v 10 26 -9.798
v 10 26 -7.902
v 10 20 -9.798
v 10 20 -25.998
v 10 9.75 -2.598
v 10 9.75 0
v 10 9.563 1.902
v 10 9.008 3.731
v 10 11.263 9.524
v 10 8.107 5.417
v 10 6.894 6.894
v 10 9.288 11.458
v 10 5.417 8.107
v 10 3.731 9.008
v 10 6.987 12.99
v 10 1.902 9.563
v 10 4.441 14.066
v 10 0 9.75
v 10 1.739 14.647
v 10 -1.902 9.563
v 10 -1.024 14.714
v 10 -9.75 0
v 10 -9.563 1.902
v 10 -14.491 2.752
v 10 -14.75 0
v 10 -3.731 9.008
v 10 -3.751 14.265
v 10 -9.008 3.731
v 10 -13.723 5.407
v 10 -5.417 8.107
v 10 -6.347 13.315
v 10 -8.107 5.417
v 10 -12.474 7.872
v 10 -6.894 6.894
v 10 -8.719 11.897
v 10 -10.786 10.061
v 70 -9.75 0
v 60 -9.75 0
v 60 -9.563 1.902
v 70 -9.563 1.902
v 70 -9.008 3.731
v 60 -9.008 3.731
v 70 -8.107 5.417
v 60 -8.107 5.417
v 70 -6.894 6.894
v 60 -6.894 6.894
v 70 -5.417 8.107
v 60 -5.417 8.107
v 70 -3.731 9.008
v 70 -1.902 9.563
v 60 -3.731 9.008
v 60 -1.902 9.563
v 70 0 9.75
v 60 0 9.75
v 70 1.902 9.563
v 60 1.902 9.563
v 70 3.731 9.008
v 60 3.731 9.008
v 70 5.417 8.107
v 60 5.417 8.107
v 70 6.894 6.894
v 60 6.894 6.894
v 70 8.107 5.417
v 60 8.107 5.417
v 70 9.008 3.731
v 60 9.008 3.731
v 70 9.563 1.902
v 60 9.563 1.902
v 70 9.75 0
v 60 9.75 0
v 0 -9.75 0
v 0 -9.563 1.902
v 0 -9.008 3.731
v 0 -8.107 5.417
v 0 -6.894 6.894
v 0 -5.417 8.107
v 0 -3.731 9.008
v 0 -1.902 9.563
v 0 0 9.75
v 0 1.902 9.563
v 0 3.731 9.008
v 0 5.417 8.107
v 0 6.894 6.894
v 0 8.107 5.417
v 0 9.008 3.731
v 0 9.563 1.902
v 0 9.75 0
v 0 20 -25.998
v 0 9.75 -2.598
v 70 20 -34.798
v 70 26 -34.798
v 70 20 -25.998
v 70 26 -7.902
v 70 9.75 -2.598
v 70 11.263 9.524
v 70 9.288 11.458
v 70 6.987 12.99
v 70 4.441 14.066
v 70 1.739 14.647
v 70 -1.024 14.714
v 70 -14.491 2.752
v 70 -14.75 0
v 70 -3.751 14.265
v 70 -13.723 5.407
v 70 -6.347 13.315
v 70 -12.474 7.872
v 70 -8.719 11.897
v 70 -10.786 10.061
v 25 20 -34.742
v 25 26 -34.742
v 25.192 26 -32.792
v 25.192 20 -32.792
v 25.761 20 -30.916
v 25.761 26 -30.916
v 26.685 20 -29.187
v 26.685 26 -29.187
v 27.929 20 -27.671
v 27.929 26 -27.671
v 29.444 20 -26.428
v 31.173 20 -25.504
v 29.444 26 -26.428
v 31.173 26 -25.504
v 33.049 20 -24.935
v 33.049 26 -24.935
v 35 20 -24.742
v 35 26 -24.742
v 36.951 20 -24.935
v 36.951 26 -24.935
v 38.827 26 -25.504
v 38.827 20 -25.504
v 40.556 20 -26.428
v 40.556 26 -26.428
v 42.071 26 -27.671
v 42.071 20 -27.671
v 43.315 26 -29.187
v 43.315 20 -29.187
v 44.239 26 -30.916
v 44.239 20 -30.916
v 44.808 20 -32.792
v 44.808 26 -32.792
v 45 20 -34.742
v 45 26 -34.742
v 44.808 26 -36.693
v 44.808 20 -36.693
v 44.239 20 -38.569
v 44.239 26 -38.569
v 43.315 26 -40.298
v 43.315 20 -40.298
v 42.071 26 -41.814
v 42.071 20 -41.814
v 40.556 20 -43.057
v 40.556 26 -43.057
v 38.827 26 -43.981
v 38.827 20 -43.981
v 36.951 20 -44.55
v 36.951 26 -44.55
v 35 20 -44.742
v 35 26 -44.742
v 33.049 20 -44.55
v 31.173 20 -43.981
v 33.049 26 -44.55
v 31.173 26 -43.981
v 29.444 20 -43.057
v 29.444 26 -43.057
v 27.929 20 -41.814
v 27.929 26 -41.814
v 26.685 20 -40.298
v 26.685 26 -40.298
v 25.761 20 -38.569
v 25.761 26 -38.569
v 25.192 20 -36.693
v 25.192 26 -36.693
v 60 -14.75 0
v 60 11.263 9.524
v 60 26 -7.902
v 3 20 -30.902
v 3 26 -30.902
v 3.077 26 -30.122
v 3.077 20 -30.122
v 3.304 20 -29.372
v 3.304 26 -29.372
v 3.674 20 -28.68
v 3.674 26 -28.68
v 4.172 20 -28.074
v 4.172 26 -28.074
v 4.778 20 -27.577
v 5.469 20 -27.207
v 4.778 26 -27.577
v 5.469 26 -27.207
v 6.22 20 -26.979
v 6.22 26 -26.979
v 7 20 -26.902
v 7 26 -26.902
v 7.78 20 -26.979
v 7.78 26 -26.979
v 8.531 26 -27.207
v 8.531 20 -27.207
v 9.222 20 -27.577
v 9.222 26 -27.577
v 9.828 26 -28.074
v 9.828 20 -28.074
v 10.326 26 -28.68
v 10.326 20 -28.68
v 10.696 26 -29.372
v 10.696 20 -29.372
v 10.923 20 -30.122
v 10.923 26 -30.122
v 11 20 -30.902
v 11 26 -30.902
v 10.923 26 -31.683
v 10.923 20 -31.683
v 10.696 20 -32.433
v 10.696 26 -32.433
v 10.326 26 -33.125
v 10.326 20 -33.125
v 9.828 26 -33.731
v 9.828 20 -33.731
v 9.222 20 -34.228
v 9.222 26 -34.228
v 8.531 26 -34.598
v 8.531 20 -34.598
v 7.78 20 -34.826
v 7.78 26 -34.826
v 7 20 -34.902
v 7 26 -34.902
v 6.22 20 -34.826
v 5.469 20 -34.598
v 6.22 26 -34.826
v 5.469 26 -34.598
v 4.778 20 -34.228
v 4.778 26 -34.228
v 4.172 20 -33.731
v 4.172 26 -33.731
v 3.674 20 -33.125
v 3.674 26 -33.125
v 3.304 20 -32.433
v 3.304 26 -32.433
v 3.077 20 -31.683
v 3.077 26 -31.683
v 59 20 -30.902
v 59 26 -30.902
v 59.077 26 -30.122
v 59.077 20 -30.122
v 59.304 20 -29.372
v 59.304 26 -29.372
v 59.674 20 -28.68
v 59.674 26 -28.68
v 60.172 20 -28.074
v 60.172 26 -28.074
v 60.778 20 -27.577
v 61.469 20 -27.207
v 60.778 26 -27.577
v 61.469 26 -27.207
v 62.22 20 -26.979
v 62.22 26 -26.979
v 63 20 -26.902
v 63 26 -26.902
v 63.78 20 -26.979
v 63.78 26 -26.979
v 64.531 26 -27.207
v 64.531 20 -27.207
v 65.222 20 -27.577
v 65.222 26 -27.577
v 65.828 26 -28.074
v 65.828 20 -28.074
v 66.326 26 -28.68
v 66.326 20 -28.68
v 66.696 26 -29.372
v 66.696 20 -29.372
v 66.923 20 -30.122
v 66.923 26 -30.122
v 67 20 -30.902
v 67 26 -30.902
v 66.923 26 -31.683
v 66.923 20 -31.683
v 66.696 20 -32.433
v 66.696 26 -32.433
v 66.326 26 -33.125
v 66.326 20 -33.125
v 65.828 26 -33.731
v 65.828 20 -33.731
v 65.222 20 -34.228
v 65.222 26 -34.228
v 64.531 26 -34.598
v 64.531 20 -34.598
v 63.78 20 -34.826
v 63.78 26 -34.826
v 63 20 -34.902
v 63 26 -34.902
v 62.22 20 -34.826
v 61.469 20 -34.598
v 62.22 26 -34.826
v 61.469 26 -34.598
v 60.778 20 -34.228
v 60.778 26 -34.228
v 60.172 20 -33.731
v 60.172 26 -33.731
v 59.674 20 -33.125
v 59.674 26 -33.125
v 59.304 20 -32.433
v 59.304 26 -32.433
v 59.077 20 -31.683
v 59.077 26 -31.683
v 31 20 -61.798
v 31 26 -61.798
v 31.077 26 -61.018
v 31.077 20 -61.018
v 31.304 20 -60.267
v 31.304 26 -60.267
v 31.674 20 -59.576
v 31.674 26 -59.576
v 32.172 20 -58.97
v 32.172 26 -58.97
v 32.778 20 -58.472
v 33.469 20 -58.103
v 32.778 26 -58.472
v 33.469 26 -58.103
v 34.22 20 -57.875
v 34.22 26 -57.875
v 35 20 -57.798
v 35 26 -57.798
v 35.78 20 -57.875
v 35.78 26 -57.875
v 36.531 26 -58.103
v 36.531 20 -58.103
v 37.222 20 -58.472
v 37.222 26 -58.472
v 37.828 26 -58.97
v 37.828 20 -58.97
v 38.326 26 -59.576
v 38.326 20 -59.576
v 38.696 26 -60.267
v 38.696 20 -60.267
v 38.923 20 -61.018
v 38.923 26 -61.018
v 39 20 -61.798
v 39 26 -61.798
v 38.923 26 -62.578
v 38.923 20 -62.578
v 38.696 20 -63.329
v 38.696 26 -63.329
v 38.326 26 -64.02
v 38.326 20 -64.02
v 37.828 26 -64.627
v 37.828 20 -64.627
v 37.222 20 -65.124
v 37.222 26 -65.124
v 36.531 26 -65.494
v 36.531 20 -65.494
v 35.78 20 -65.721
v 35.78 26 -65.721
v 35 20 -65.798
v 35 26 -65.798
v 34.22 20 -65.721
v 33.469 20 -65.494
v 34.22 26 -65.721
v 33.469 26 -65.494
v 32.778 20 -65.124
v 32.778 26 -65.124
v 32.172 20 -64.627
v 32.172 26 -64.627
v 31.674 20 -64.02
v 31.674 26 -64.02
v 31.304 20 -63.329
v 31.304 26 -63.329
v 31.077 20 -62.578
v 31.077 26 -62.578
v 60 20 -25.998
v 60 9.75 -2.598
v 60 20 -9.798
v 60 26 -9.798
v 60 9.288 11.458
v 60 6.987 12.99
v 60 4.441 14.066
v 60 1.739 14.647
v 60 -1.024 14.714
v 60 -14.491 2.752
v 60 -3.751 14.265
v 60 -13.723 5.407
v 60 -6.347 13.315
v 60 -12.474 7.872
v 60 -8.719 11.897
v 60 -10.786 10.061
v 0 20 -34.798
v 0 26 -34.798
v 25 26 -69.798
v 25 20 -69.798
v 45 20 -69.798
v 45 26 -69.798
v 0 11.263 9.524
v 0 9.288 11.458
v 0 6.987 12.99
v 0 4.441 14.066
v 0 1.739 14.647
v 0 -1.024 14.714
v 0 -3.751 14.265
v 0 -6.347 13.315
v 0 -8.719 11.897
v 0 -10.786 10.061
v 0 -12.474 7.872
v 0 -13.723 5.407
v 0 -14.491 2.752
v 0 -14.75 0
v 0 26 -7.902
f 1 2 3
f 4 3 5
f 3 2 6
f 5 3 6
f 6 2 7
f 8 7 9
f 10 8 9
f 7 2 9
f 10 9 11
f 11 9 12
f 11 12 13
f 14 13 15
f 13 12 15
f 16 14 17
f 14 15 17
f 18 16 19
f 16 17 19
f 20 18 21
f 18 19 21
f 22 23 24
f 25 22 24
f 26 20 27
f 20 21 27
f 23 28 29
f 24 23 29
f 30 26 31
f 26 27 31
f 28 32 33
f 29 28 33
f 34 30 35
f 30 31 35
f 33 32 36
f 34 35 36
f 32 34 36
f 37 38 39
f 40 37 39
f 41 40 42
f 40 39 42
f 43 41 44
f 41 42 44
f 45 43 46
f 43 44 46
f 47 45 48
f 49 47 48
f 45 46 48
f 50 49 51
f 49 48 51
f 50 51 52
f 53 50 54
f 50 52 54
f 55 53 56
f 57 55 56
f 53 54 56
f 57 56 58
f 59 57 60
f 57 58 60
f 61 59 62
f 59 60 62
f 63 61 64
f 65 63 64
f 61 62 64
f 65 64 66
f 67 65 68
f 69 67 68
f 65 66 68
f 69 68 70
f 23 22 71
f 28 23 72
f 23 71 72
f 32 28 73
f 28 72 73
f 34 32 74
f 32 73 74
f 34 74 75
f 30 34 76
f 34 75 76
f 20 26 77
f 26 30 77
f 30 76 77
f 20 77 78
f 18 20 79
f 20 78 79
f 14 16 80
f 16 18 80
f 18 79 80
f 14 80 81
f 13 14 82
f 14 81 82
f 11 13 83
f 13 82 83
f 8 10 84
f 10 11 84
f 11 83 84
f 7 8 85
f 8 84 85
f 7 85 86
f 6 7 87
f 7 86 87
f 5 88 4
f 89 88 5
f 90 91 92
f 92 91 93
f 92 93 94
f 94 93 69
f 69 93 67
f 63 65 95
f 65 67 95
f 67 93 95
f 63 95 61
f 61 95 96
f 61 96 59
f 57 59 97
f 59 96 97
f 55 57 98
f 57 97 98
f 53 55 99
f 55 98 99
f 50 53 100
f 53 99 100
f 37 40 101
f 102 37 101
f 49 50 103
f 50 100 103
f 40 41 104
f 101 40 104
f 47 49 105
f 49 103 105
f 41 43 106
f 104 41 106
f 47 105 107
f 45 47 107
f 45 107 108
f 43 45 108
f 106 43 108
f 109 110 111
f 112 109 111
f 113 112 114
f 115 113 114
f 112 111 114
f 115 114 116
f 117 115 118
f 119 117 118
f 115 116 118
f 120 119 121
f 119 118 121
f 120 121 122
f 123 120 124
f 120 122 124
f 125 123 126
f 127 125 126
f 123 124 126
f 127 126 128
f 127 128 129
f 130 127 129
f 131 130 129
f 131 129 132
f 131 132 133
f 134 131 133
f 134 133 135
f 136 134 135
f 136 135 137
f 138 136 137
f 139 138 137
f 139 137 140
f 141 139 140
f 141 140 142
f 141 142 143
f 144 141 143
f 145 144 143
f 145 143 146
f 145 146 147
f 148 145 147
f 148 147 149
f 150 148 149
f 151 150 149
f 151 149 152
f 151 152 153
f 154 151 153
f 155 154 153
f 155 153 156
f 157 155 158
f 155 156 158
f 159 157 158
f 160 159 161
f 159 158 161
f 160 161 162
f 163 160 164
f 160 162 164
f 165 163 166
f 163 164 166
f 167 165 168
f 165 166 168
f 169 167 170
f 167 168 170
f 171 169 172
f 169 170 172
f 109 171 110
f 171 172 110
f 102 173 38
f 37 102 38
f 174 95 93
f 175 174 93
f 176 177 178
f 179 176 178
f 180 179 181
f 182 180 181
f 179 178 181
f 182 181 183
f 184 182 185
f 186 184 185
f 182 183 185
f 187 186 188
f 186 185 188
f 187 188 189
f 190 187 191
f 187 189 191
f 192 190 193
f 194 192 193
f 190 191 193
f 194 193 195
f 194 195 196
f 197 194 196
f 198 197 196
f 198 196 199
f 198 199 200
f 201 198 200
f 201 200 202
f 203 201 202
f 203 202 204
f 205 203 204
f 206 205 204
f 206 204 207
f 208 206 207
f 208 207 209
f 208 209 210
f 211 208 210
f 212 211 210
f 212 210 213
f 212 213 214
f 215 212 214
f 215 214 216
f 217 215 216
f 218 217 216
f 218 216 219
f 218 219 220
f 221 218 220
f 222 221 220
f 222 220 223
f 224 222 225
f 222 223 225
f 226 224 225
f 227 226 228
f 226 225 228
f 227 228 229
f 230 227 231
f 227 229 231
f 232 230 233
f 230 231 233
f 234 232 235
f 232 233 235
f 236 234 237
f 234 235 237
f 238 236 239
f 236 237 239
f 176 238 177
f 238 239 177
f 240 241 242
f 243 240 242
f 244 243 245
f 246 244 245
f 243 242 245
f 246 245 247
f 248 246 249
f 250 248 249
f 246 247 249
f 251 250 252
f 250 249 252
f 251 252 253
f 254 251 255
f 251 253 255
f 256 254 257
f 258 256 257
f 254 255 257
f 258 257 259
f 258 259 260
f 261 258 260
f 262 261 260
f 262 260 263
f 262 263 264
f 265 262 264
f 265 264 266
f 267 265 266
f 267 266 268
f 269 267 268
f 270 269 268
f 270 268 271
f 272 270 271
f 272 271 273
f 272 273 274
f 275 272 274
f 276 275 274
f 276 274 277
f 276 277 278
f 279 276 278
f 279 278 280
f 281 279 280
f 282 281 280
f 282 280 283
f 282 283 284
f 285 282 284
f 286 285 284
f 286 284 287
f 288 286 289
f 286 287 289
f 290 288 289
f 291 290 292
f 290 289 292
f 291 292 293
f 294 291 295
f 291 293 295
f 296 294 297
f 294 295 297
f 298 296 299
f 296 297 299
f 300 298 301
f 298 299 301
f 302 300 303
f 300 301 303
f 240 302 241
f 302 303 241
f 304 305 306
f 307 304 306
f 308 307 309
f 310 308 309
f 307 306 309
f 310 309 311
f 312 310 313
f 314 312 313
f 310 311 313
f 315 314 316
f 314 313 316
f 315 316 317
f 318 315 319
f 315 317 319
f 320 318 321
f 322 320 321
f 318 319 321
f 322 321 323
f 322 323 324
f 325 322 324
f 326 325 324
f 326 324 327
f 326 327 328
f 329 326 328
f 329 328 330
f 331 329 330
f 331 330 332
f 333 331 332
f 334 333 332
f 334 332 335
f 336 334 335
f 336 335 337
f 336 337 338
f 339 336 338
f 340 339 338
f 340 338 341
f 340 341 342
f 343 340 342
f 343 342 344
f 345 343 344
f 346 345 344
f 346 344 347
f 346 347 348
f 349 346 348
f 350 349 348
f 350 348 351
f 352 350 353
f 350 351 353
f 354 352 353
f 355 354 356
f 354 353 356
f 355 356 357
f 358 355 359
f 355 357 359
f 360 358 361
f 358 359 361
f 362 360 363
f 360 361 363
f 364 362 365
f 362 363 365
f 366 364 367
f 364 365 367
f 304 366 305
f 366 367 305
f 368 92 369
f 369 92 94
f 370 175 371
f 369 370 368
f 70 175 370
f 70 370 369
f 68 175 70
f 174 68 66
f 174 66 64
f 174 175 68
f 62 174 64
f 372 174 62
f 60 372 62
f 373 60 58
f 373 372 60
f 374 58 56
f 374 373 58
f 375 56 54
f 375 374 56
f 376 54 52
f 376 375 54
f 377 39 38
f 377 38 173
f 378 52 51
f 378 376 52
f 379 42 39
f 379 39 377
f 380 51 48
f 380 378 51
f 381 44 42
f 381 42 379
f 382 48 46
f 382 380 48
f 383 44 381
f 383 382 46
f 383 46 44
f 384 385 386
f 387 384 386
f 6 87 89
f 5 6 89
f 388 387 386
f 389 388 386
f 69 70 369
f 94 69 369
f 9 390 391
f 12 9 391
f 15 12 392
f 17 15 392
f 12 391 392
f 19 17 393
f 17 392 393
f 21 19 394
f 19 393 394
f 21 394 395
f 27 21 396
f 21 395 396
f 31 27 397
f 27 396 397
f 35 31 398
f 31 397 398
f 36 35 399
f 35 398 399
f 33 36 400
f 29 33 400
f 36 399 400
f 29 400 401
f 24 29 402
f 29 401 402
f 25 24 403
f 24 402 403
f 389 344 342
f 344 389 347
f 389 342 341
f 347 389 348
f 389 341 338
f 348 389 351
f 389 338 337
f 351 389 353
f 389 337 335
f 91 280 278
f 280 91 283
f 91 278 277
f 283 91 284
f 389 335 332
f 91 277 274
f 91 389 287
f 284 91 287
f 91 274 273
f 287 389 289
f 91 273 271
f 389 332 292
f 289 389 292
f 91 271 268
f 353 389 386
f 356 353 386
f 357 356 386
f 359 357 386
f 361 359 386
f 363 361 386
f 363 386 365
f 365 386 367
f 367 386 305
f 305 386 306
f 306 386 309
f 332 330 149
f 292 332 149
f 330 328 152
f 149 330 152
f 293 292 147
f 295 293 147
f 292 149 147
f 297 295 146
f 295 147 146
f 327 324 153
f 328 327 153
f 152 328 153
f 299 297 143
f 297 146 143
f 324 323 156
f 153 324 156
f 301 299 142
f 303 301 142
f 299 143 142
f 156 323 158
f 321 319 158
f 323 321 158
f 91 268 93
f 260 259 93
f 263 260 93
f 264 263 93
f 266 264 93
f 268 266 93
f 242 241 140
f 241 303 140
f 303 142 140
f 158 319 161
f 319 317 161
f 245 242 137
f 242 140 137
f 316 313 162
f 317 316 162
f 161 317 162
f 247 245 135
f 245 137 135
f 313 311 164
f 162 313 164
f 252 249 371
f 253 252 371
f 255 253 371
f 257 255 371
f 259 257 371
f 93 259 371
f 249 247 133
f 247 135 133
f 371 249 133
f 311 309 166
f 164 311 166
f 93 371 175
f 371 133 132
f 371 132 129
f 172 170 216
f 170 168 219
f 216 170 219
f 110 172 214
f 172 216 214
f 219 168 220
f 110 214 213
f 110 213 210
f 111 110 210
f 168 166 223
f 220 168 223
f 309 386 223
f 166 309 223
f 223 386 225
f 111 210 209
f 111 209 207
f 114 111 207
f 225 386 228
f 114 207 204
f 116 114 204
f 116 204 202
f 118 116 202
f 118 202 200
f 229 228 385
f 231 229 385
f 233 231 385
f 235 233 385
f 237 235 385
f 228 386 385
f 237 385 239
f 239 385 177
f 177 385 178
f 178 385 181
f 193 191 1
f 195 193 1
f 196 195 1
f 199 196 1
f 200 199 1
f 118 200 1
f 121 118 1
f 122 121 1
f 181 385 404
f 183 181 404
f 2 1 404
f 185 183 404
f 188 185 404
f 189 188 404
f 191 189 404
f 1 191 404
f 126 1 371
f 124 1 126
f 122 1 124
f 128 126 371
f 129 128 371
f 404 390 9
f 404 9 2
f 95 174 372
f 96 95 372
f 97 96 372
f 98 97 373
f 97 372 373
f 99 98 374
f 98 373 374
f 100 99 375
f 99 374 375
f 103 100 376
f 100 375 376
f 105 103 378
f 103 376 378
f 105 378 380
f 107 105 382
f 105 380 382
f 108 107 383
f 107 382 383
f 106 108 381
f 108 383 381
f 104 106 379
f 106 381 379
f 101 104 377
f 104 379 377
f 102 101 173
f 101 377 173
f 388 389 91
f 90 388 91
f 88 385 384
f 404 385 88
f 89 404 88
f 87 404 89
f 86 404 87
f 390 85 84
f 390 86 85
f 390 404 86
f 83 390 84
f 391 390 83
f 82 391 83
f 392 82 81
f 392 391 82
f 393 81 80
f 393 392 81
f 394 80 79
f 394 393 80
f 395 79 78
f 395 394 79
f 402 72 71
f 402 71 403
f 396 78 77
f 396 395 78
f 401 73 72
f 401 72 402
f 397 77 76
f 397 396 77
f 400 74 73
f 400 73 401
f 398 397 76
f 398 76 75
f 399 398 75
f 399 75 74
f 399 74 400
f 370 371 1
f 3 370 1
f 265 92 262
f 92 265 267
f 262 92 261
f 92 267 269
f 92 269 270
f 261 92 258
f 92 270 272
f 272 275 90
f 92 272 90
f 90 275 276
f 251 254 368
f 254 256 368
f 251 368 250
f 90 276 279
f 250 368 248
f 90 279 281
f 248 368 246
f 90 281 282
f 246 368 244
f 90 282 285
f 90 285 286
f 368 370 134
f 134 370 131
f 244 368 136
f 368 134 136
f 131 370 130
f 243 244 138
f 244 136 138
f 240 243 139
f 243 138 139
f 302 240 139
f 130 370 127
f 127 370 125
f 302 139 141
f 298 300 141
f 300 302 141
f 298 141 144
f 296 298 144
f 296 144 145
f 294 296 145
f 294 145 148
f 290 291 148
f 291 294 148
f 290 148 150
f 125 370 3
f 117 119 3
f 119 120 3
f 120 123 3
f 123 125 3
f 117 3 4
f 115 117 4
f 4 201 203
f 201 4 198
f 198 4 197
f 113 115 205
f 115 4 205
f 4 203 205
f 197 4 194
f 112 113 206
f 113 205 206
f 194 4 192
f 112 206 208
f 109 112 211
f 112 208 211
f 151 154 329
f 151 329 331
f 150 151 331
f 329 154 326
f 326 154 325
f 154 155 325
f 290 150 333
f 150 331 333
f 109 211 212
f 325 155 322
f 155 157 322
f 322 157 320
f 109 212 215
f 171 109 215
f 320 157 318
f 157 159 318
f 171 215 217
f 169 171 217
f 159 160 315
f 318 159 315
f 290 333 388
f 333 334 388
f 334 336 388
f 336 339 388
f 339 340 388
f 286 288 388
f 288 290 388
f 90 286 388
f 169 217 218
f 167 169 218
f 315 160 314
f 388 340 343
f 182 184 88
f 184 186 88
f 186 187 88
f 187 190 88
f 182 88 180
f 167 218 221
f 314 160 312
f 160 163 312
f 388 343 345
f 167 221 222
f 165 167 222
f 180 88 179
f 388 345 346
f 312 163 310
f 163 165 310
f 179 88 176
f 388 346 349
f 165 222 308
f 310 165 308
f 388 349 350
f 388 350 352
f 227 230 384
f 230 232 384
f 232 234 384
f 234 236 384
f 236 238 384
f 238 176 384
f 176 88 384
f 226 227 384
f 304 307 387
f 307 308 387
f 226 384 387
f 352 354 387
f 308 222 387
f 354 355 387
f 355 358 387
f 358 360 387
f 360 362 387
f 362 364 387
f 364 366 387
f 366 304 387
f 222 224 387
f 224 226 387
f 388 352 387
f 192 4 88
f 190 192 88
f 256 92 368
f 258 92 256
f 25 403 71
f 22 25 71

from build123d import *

# Parameters (mm, degrees)
F1_DEPTH  = 70
F4_W      = 50
F4_H      = 24.5480843189
F5_DEPTH  = 25
F7_DEPTH  = 40.7510000745
F8_R      = 10
F9_DEPTH  = 40.7510000745
F10_R     = 6.38
F11_DEPTH = 40.7510000745
F6_R      = 4
F12_DEPTH = 40.7510000745
F15_DEPTH = 10
F16_R     = 4
F17_DEPTH = 40.7510000745
F19_DEPTH = 10


# Not quite as in the source:
# - a pattern or mirror of a feature is missing from the dataset's text; its kind, count and spacing are read off the source's solid


with BuildPart() as f1:
    # F0 (on Right) → F1 (new body)
    with BuildSketch(Plane.YZ):
        with BuildLine():
            ThreePointArc((-9.75, 0), (0, 9.75), (9.75, 0))
            Line((9.75, 0), (9.75, -2.5980842444))
            Line((9.75, -2.5980842444), (20, -9.7980842444))
            Line((20, -9.7980842444), (20, -69.7980842444))
            Line((20, -69.7980842444), (26, -69.7980842444))
            Line((26, -69.7980842444), (26, -7.9024389721))
            Line((26, -7.9024389721), (14.7500000745, 0))
            ThreePointArc((14.7500000745, 0), (0, 14.7500000745), (-14.7500000745, 0))
            Line((-14.7500000745, 0), (-9.75, 0))
        make_face()
    extrude(amount=F1_DEPTH)

    # F4 (on face) → F5 (cut)
    with BuildSketch(Plane(origin=(0, 26, 0), x_dir=(-1, 0, 0), z_dir=(0, 1, 0))):
        Polygon((-45, -69.7980842444), (-70, -34.7980842444), (-90, -34.7980842444), (-90, -94.7980842444), (20, -94.7980842444), (20, -34.7980842444), (0, -34.7980842444), (-25, -69.7980842444), align=None)
        with Locations((-35, 2.475957915)):
            Rectangle(F4_W, F4_H)
    extrude(amount=-F5_DEPTH, mode=Mode.SUBTRACT)

    # F4 (on face) → F7 (cut, through all)
    with BuildSketch(Plane(origin=(0, 26, 0), x_dir=(-1, 0, 0), z_dir=(0, 1, 0))):
        Polygon((-45, -69.7980842444), (-70, -34.7980842444), (-90, -34.7980842444), (-90, -94.7980842444), (20, -94.7980842444), (20, -34.7980842444), (0, -34.7980842444), (-25, -69.7980842444), align=None)
        with Locations((-35, 2.475957915)):
            Rectangle(F4_W, F4_H)
    extrude(amount=-F7_DEPTH, mode=Mode.SUBTRACT)

    # F8 (on face) → F9 (cut, through all)
    with BuildSketch(Plane(origin=(0, 26, 0), x_dir=(-1, 0, 0), z_dir=(0, 1, 0))):
        with Locations((-35, -34.7424389721)):
            Circle(F8_R)
    extrude(amount=-F9_DEPTH, mode=Mode.SUBTRACT)

    # F10 (on face) → F11 (cut, through all)
    with BuildSketch(Plane(origin=(0, 26, 0), x_dir=(-1, 0, 0), z_dir=(0, 1, 0))):
        with Locations((-35, -34.7424389721)):
            Circle(F10_R)
    extrude(amount=-F11_DEPTH, mode=Mode.SUBTRACT)

    # F6 (on face) → F12 (cut, through all)
    with BuildSketch(Plane(origin=(0, 26, 0), x_dir=(-1, 0, 0), z_dir=(0, 1, 0))):
        with Locations((-63, -30.9024389721)):
            Circle(F6_R)
        with Locations((-7, -30.9024389721)):
            Circle(F6_R)
    extrude(amount=-F12_DEPTH, mode=Mode.SUBTRACT)

    # F14 (on face) → F15 (join)
    with BuildSketch(Plane(origin=(0, 0, 0), x_dir=(0, -1, 0), z_dir=(-1, 0, 0))):
        Polygon((-20, -9.7980842444), (-20, -25.9981378913), (-9.75, -2.5980842444), align=None)
    f15 = extrude(amount=-F15_DEPTH)

    # F15_copies: F15 across plane
    add(f15.mirror(Plane(origin=(35, 0, 0), x_dir=(0, 0, 1), z_dir=(1, 0, 0))))

    # F16 (on face) → F17 (cut, through all)
    with BuildSketch(Plane(origin=(0, 26, 0), x_dir=(-1, 0, 0), z_dir=(0, 1, 0))):
        with Locations((-35, -61.7980842444)):
            Circle(F16_R)
    extrude(amount=-F17_DEPTH, mode=Mode.SUBTRACT)

    # F18 (on face) → F19 (join)
    with BuildSketch(Plane(origin=(0, 0, 0), x_dir=(0, -1, 0), z_dir=(-1, 0, 0))):
        Polygon((-11.2626504483, 9.5244531117), (-26, -7.9024389721), (-14.7500000745, 0), align=None)
    f19 = extrude(amount=-F19_DEPTH)

    # F19_copies: F19 across plane
    add(f19.mirror(Plane(origin=(35, 0, 0), x_dir=(0, 0, 1), z_dir=(1, 0, 0))))


solid = f1.part
